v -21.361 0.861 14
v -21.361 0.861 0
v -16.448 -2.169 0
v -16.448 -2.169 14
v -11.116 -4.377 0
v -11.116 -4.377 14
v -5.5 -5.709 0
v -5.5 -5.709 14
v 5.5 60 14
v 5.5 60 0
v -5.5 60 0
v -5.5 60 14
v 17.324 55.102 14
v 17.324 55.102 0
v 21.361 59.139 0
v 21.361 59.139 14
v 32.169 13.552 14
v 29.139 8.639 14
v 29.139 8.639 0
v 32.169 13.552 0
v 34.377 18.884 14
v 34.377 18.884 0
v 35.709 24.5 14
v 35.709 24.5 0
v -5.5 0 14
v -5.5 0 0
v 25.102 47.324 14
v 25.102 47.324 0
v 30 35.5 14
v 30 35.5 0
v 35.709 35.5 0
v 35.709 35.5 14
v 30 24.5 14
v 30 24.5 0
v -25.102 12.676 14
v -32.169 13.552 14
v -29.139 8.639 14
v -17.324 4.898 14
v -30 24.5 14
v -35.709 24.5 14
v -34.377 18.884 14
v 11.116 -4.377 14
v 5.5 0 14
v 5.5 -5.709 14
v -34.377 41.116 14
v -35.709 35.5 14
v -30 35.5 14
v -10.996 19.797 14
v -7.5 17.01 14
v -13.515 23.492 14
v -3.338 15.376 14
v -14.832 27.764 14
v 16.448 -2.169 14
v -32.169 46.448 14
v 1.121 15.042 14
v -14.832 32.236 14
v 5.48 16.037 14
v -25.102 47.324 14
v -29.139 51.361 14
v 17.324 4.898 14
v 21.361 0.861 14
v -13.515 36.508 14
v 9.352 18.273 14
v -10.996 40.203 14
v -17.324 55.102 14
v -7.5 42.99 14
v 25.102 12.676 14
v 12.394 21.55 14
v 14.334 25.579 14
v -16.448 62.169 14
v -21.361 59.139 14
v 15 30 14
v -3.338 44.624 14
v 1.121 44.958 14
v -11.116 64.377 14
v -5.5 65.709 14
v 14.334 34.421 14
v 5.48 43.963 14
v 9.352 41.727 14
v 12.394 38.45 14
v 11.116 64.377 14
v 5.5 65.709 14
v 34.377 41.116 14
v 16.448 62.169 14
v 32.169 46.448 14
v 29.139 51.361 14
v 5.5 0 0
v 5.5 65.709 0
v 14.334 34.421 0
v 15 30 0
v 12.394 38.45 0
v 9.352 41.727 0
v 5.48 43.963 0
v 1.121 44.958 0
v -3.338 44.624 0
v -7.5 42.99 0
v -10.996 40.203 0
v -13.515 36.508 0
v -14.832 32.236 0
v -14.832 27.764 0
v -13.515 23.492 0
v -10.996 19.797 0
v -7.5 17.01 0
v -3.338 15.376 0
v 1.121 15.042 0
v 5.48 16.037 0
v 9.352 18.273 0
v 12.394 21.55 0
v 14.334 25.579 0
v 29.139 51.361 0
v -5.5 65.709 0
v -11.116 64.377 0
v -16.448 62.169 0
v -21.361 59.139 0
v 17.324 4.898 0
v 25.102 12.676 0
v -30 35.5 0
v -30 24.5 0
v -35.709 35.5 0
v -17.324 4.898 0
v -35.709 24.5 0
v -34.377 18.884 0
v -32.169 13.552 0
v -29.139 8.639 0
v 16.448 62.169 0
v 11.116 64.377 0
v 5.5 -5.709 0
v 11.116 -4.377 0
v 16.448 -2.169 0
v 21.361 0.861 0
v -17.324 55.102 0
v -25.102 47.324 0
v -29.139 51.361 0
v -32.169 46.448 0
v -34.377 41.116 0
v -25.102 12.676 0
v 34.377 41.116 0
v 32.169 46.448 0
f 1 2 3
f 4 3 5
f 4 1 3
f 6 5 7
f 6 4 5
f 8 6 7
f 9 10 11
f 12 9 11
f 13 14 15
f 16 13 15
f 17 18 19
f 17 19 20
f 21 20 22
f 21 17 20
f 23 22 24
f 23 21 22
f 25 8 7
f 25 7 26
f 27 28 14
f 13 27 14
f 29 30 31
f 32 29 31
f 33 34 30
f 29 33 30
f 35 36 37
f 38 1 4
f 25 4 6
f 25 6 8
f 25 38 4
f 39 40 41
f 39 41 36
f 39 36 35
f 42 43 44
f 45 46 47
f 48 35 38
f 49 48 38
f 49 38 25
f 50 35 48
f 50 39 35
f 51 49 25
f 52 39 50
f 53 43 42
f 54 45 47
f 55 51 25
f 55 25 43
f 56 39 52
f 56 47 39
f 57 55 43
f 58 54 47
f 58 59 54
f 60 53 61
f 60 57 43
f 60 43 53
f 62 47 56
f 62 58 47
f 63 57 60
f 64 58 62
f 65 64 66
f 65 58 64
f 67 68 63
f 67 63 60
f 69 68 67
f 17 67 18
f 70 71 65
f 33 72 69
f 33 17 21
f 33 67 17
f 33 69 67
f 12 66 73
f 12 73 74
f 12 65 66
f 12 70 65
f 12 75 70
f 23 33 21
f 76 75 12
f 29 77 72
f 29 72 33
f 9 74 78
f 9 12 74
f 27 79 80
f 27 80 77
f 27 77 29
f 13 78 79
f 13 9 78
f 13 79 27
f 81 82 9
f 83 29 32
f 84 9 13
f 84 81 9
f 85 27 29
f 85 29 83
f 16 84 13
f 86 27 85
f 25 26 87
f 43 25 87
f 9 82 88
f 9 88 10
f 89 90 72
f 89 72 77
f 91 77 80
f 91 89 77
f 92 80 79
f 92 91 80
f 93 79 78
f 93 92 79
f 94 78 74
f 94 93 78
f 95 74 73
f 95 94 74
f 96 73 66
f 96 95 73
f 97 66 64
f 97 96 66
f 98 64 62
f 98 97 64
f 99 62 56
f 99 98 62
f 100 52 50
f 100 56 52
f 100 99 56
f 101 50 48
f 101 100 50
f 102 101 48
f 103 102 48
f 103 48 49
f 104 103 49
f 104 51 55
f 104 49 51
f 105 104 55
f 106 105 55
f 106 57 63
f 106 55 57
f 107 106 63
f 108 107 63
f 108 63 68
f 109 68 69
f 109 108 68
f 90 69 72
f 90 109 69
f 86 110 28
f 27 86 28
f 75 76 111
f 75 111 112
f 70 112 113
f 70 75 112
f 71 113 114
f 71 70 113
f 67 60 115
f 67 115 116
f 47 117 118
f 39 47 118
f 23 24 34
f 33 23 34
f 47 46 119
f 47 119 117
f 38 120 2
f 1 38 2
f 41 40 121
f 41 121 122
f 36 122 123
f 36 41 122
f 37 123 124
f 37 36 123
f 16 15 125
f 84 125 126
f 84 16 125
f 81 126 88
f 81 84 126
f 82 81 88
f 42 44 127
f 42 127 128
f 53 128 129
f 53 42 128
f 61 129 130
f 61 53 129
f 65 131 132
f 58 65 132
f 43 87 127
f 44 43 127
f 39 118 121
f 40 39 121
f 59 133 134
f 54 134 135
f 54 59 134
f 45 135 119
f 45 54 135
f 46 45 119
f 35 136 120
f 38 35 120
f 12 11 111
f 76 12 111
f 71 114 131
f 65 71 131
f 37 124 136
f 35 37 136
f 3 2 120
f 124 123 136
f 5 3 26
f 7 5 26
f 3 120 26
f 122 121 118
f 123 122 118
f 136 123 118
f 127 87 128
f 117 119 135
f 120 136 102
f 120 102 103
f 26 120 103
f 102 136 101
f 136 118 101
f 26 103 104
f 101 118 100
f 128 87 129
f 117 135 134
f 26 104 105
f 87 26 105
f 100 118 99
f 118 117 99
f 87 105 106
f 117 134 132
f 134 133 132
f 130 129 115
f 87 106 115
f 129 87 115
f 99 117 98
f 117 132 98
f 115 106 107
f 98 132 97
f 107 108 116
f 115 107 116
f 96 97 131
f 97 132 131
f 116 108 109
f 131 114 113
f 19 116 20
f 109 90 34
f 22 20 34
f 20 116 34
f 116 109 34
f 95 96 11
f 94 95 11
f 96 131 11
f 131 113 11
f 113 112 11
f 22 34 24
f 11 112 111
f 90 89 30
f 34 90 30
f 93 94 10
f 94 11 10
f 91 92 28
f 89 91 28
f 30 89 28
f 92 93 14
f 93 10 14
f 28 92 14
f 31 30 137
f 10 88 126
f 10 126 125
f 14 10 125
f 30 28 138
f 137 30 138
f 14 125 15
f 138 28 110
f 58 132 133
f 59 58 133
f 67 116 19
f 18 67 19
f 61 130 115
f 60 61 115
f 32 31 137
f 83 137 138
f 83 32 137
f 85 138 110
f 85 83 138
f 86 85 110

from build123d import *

# Parameters (mm, degrees)
BOSS_EXTRU_1_DEPTH           = 14
ENL_V_MAT_EXTRU_1_DEPTH      = 89.577649551
ENL_V_MAT_EXTRU_1_DEPTH_BACK = 89.577649551
ESQUISSE2_R                  = 15
ESQUISSE3_R                  = 45.33486517
ESQUISSE3_R_2                = 36.129973706
ENL_V_MAT_EXTRU_2_DEPTH      = 89.577649551


with BuildPart() as part:
    # Esquisse1 → Boss.-Extru.1 (new body)
    with BuildSketch(Plane.XY):
        Polygon((-5.5, 0), (5.5, 0), (5.5, -15), (21.360912703, 0.860912703), (17.324116139, 4.897709268), (25.102290732, 12.675883861), (29.139087297, 8.639087297), (45, 24.5), (30, 24.5), (30, 35.5), (45, 35.5), (29.139087297, 51.360912703), (25.102290732, 47.324116139), (17.324116139, 55.102290732), (21.360912703, 59.139087297), (5.5, 75), (5.5, 60), (-5.5, 60), (-5.5, 75), (-21.360912703, 59.139087297), (-17.324116139, 55.102290732), (-25.102290732, 47.324116139), (-29.139087297, 51.360912703), (-45, 35.5), (-30, 35.5), (-30, 24.5), (-45, 24.5), (-29.139087297, 8.639087297), (-25.102290732, 12.675883861), (-17.324116139, 4.897709268), (-21.360912703, 0.860912703), (-5.5, -15), align=None)
    extrude(amount=BOSS_EXTRU_1_DEPTH)

    # Esquisse2 → Enlèv. mat.-Extru.1 (cut, two sides: drawn at the far end of the back side and taken through both)
    with BuildSketch(Plane.XY.offset(14).offset(-ENL_V_MAT_EXTRU_1_DEPTH_BACK)):
        with Locations((0, 30)):
            Circle(ESQUISSE2_R)
    extrude(amount=ENL_V_MAT_EXTRU_1_DEPTH + ENL_V_MAT_EXTRU_1_DEPTH_BACK, mode=Mode.SUBTRACT)

    # Esquisse3 → Enlèv. mat.-Extru.2 (cut, through all)
    with BuildSketch(Plane.XY.offset(14)):
        with Locations((0, 30)):
            Circle(ESQUISSE3_R)
        with Locations((0, 30)):
            Circle(ESQUISSE3_R_2, mode=Mode.SUBTRACT)
    extrude(amount=-ENL_V_MAT_EXTRU_2_DEPTH, mode=Mode.SUBTRACT)


solid = part.part
